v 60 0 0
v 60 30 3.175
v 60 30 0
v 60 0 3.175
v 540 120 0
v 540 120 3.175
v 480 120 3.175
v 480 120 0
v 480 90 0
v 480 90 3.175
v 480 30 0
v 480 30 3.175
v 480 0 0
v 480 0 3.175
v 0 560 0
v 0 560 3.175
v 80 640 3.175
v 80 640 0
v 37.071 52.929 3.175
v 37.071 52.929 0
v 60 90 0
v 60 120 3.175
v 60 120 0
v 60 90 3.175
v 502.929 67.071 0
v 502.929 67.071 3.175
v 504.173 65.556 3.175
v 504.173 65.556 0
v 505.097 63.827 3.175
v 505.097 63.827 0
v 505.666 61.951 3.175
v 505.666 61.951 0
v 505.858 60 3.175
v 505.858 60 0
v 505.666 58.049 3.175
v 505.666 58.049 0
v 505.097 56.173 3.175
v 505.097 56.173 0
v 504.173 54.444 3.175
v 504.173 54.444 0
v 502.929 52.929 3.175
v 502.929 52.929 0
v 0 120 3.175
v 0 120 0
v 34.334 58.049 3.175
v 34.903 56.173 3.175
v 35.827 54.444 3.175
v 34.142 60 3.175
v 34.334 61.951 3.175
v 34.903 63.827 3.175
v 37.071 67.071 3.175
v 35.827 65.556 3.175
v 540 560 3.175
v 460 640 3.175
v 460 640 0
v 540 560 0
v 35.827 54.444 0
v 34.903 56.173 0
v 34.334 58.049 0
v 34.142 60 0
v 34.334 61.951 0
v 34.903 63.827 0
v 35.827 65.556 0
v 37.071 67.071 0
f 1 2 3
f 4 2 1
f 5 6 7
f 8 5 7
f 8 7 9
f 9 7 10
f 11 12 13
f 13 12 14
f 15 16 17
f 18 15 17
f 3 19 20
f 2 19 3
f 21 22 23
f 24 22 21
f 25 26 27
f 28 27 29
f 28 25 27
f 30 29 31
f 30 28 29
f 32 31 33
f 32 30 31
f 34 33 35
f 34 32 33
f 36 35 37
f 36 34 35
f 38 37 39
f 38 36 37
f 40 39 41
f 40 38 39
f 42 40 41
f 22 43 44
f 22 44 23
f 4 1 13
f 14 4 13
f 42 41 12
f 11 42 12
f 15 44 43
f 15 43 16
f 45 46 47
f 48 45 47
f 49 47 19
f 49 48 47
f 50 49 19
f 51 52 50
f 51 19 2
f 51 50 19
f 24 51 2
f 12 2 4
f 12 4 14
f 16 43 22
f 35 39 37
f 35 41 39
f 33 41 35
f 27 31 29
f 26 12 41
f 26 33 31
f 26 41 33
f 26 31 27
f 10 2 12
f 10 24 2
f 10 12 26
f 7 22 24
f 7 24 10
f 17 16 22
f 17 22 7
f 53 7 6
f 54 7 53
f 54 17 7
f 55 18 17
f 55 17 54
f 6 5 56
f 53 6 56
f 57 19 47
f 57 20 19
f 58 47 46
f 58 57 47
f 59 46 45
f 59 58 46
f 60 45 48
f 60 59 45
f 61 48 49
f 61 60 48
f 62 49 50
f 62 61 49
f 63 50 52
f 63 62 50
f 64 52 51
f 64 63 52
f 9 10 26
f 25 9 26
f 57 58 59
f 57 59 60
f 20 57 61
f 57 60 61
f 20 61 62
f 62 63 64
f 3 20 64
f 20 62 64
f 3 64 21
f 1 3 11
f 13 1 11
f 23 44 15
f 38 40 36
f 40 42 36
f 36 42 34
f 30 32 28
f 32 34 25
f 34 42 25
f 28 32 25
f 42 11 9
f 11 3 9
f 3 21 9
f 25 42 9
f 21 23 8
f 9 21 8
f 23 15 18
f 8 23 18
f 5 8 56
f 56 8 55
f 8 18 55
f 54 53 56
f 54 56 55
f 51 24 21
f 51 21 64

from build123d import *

# Parameters (mm, degrees)
SKETCH2_W           = 540
SKETCH2_H           = 640
BOSS_EXTRUDE1_DEPTH = 3.175
CUT_EXTRUDE1_DEPTH  = 838.382875765
FILLET1_R           = 10


with BuildPart() as part:
    # Sketch2 → Boss-Extrude1 (new body)
    with BuildSketch(Plane.XY):
        with Locations((270, 320)):
            Rectangle(SKETCH2_W, SKETCH2_H)
    extrude(amount=BOSS_EXTRUDE1_DEPTH)

    # Sketch3 → Cut-Extrude1 (cut, through all)
    with BuildSketch(Plane.XY.offset(3.175)):
        Polygon((0, 640), (0, 560), (80, 640), align=None)
        Polygon((540, 560), (460, 640), (540, 640), align=None)
        Polygon((0, 120), (60, 120), (60, 90), (30, 60), (60, 30), (60, 0), (0, 0), align=None)
        Polygon((540, 0), (540, 120), (480, 120), (480, 90), (510, 60), (480, 30), (480, 0), align=None)
    extrude(amount=-CUT_EXTRUDE1_DEPTH, mode=Mode.SUBTRACT)

    # Fillet1
    fillet1_edges = [part.edges().sort_by_distance(p)[0] for p in [
        (30, 60, 1.5875),
        (510, 60, 1.5875),
    ]]
    fillet(fillet1_edges, radius=FILLET1_R)


solid = part.part
